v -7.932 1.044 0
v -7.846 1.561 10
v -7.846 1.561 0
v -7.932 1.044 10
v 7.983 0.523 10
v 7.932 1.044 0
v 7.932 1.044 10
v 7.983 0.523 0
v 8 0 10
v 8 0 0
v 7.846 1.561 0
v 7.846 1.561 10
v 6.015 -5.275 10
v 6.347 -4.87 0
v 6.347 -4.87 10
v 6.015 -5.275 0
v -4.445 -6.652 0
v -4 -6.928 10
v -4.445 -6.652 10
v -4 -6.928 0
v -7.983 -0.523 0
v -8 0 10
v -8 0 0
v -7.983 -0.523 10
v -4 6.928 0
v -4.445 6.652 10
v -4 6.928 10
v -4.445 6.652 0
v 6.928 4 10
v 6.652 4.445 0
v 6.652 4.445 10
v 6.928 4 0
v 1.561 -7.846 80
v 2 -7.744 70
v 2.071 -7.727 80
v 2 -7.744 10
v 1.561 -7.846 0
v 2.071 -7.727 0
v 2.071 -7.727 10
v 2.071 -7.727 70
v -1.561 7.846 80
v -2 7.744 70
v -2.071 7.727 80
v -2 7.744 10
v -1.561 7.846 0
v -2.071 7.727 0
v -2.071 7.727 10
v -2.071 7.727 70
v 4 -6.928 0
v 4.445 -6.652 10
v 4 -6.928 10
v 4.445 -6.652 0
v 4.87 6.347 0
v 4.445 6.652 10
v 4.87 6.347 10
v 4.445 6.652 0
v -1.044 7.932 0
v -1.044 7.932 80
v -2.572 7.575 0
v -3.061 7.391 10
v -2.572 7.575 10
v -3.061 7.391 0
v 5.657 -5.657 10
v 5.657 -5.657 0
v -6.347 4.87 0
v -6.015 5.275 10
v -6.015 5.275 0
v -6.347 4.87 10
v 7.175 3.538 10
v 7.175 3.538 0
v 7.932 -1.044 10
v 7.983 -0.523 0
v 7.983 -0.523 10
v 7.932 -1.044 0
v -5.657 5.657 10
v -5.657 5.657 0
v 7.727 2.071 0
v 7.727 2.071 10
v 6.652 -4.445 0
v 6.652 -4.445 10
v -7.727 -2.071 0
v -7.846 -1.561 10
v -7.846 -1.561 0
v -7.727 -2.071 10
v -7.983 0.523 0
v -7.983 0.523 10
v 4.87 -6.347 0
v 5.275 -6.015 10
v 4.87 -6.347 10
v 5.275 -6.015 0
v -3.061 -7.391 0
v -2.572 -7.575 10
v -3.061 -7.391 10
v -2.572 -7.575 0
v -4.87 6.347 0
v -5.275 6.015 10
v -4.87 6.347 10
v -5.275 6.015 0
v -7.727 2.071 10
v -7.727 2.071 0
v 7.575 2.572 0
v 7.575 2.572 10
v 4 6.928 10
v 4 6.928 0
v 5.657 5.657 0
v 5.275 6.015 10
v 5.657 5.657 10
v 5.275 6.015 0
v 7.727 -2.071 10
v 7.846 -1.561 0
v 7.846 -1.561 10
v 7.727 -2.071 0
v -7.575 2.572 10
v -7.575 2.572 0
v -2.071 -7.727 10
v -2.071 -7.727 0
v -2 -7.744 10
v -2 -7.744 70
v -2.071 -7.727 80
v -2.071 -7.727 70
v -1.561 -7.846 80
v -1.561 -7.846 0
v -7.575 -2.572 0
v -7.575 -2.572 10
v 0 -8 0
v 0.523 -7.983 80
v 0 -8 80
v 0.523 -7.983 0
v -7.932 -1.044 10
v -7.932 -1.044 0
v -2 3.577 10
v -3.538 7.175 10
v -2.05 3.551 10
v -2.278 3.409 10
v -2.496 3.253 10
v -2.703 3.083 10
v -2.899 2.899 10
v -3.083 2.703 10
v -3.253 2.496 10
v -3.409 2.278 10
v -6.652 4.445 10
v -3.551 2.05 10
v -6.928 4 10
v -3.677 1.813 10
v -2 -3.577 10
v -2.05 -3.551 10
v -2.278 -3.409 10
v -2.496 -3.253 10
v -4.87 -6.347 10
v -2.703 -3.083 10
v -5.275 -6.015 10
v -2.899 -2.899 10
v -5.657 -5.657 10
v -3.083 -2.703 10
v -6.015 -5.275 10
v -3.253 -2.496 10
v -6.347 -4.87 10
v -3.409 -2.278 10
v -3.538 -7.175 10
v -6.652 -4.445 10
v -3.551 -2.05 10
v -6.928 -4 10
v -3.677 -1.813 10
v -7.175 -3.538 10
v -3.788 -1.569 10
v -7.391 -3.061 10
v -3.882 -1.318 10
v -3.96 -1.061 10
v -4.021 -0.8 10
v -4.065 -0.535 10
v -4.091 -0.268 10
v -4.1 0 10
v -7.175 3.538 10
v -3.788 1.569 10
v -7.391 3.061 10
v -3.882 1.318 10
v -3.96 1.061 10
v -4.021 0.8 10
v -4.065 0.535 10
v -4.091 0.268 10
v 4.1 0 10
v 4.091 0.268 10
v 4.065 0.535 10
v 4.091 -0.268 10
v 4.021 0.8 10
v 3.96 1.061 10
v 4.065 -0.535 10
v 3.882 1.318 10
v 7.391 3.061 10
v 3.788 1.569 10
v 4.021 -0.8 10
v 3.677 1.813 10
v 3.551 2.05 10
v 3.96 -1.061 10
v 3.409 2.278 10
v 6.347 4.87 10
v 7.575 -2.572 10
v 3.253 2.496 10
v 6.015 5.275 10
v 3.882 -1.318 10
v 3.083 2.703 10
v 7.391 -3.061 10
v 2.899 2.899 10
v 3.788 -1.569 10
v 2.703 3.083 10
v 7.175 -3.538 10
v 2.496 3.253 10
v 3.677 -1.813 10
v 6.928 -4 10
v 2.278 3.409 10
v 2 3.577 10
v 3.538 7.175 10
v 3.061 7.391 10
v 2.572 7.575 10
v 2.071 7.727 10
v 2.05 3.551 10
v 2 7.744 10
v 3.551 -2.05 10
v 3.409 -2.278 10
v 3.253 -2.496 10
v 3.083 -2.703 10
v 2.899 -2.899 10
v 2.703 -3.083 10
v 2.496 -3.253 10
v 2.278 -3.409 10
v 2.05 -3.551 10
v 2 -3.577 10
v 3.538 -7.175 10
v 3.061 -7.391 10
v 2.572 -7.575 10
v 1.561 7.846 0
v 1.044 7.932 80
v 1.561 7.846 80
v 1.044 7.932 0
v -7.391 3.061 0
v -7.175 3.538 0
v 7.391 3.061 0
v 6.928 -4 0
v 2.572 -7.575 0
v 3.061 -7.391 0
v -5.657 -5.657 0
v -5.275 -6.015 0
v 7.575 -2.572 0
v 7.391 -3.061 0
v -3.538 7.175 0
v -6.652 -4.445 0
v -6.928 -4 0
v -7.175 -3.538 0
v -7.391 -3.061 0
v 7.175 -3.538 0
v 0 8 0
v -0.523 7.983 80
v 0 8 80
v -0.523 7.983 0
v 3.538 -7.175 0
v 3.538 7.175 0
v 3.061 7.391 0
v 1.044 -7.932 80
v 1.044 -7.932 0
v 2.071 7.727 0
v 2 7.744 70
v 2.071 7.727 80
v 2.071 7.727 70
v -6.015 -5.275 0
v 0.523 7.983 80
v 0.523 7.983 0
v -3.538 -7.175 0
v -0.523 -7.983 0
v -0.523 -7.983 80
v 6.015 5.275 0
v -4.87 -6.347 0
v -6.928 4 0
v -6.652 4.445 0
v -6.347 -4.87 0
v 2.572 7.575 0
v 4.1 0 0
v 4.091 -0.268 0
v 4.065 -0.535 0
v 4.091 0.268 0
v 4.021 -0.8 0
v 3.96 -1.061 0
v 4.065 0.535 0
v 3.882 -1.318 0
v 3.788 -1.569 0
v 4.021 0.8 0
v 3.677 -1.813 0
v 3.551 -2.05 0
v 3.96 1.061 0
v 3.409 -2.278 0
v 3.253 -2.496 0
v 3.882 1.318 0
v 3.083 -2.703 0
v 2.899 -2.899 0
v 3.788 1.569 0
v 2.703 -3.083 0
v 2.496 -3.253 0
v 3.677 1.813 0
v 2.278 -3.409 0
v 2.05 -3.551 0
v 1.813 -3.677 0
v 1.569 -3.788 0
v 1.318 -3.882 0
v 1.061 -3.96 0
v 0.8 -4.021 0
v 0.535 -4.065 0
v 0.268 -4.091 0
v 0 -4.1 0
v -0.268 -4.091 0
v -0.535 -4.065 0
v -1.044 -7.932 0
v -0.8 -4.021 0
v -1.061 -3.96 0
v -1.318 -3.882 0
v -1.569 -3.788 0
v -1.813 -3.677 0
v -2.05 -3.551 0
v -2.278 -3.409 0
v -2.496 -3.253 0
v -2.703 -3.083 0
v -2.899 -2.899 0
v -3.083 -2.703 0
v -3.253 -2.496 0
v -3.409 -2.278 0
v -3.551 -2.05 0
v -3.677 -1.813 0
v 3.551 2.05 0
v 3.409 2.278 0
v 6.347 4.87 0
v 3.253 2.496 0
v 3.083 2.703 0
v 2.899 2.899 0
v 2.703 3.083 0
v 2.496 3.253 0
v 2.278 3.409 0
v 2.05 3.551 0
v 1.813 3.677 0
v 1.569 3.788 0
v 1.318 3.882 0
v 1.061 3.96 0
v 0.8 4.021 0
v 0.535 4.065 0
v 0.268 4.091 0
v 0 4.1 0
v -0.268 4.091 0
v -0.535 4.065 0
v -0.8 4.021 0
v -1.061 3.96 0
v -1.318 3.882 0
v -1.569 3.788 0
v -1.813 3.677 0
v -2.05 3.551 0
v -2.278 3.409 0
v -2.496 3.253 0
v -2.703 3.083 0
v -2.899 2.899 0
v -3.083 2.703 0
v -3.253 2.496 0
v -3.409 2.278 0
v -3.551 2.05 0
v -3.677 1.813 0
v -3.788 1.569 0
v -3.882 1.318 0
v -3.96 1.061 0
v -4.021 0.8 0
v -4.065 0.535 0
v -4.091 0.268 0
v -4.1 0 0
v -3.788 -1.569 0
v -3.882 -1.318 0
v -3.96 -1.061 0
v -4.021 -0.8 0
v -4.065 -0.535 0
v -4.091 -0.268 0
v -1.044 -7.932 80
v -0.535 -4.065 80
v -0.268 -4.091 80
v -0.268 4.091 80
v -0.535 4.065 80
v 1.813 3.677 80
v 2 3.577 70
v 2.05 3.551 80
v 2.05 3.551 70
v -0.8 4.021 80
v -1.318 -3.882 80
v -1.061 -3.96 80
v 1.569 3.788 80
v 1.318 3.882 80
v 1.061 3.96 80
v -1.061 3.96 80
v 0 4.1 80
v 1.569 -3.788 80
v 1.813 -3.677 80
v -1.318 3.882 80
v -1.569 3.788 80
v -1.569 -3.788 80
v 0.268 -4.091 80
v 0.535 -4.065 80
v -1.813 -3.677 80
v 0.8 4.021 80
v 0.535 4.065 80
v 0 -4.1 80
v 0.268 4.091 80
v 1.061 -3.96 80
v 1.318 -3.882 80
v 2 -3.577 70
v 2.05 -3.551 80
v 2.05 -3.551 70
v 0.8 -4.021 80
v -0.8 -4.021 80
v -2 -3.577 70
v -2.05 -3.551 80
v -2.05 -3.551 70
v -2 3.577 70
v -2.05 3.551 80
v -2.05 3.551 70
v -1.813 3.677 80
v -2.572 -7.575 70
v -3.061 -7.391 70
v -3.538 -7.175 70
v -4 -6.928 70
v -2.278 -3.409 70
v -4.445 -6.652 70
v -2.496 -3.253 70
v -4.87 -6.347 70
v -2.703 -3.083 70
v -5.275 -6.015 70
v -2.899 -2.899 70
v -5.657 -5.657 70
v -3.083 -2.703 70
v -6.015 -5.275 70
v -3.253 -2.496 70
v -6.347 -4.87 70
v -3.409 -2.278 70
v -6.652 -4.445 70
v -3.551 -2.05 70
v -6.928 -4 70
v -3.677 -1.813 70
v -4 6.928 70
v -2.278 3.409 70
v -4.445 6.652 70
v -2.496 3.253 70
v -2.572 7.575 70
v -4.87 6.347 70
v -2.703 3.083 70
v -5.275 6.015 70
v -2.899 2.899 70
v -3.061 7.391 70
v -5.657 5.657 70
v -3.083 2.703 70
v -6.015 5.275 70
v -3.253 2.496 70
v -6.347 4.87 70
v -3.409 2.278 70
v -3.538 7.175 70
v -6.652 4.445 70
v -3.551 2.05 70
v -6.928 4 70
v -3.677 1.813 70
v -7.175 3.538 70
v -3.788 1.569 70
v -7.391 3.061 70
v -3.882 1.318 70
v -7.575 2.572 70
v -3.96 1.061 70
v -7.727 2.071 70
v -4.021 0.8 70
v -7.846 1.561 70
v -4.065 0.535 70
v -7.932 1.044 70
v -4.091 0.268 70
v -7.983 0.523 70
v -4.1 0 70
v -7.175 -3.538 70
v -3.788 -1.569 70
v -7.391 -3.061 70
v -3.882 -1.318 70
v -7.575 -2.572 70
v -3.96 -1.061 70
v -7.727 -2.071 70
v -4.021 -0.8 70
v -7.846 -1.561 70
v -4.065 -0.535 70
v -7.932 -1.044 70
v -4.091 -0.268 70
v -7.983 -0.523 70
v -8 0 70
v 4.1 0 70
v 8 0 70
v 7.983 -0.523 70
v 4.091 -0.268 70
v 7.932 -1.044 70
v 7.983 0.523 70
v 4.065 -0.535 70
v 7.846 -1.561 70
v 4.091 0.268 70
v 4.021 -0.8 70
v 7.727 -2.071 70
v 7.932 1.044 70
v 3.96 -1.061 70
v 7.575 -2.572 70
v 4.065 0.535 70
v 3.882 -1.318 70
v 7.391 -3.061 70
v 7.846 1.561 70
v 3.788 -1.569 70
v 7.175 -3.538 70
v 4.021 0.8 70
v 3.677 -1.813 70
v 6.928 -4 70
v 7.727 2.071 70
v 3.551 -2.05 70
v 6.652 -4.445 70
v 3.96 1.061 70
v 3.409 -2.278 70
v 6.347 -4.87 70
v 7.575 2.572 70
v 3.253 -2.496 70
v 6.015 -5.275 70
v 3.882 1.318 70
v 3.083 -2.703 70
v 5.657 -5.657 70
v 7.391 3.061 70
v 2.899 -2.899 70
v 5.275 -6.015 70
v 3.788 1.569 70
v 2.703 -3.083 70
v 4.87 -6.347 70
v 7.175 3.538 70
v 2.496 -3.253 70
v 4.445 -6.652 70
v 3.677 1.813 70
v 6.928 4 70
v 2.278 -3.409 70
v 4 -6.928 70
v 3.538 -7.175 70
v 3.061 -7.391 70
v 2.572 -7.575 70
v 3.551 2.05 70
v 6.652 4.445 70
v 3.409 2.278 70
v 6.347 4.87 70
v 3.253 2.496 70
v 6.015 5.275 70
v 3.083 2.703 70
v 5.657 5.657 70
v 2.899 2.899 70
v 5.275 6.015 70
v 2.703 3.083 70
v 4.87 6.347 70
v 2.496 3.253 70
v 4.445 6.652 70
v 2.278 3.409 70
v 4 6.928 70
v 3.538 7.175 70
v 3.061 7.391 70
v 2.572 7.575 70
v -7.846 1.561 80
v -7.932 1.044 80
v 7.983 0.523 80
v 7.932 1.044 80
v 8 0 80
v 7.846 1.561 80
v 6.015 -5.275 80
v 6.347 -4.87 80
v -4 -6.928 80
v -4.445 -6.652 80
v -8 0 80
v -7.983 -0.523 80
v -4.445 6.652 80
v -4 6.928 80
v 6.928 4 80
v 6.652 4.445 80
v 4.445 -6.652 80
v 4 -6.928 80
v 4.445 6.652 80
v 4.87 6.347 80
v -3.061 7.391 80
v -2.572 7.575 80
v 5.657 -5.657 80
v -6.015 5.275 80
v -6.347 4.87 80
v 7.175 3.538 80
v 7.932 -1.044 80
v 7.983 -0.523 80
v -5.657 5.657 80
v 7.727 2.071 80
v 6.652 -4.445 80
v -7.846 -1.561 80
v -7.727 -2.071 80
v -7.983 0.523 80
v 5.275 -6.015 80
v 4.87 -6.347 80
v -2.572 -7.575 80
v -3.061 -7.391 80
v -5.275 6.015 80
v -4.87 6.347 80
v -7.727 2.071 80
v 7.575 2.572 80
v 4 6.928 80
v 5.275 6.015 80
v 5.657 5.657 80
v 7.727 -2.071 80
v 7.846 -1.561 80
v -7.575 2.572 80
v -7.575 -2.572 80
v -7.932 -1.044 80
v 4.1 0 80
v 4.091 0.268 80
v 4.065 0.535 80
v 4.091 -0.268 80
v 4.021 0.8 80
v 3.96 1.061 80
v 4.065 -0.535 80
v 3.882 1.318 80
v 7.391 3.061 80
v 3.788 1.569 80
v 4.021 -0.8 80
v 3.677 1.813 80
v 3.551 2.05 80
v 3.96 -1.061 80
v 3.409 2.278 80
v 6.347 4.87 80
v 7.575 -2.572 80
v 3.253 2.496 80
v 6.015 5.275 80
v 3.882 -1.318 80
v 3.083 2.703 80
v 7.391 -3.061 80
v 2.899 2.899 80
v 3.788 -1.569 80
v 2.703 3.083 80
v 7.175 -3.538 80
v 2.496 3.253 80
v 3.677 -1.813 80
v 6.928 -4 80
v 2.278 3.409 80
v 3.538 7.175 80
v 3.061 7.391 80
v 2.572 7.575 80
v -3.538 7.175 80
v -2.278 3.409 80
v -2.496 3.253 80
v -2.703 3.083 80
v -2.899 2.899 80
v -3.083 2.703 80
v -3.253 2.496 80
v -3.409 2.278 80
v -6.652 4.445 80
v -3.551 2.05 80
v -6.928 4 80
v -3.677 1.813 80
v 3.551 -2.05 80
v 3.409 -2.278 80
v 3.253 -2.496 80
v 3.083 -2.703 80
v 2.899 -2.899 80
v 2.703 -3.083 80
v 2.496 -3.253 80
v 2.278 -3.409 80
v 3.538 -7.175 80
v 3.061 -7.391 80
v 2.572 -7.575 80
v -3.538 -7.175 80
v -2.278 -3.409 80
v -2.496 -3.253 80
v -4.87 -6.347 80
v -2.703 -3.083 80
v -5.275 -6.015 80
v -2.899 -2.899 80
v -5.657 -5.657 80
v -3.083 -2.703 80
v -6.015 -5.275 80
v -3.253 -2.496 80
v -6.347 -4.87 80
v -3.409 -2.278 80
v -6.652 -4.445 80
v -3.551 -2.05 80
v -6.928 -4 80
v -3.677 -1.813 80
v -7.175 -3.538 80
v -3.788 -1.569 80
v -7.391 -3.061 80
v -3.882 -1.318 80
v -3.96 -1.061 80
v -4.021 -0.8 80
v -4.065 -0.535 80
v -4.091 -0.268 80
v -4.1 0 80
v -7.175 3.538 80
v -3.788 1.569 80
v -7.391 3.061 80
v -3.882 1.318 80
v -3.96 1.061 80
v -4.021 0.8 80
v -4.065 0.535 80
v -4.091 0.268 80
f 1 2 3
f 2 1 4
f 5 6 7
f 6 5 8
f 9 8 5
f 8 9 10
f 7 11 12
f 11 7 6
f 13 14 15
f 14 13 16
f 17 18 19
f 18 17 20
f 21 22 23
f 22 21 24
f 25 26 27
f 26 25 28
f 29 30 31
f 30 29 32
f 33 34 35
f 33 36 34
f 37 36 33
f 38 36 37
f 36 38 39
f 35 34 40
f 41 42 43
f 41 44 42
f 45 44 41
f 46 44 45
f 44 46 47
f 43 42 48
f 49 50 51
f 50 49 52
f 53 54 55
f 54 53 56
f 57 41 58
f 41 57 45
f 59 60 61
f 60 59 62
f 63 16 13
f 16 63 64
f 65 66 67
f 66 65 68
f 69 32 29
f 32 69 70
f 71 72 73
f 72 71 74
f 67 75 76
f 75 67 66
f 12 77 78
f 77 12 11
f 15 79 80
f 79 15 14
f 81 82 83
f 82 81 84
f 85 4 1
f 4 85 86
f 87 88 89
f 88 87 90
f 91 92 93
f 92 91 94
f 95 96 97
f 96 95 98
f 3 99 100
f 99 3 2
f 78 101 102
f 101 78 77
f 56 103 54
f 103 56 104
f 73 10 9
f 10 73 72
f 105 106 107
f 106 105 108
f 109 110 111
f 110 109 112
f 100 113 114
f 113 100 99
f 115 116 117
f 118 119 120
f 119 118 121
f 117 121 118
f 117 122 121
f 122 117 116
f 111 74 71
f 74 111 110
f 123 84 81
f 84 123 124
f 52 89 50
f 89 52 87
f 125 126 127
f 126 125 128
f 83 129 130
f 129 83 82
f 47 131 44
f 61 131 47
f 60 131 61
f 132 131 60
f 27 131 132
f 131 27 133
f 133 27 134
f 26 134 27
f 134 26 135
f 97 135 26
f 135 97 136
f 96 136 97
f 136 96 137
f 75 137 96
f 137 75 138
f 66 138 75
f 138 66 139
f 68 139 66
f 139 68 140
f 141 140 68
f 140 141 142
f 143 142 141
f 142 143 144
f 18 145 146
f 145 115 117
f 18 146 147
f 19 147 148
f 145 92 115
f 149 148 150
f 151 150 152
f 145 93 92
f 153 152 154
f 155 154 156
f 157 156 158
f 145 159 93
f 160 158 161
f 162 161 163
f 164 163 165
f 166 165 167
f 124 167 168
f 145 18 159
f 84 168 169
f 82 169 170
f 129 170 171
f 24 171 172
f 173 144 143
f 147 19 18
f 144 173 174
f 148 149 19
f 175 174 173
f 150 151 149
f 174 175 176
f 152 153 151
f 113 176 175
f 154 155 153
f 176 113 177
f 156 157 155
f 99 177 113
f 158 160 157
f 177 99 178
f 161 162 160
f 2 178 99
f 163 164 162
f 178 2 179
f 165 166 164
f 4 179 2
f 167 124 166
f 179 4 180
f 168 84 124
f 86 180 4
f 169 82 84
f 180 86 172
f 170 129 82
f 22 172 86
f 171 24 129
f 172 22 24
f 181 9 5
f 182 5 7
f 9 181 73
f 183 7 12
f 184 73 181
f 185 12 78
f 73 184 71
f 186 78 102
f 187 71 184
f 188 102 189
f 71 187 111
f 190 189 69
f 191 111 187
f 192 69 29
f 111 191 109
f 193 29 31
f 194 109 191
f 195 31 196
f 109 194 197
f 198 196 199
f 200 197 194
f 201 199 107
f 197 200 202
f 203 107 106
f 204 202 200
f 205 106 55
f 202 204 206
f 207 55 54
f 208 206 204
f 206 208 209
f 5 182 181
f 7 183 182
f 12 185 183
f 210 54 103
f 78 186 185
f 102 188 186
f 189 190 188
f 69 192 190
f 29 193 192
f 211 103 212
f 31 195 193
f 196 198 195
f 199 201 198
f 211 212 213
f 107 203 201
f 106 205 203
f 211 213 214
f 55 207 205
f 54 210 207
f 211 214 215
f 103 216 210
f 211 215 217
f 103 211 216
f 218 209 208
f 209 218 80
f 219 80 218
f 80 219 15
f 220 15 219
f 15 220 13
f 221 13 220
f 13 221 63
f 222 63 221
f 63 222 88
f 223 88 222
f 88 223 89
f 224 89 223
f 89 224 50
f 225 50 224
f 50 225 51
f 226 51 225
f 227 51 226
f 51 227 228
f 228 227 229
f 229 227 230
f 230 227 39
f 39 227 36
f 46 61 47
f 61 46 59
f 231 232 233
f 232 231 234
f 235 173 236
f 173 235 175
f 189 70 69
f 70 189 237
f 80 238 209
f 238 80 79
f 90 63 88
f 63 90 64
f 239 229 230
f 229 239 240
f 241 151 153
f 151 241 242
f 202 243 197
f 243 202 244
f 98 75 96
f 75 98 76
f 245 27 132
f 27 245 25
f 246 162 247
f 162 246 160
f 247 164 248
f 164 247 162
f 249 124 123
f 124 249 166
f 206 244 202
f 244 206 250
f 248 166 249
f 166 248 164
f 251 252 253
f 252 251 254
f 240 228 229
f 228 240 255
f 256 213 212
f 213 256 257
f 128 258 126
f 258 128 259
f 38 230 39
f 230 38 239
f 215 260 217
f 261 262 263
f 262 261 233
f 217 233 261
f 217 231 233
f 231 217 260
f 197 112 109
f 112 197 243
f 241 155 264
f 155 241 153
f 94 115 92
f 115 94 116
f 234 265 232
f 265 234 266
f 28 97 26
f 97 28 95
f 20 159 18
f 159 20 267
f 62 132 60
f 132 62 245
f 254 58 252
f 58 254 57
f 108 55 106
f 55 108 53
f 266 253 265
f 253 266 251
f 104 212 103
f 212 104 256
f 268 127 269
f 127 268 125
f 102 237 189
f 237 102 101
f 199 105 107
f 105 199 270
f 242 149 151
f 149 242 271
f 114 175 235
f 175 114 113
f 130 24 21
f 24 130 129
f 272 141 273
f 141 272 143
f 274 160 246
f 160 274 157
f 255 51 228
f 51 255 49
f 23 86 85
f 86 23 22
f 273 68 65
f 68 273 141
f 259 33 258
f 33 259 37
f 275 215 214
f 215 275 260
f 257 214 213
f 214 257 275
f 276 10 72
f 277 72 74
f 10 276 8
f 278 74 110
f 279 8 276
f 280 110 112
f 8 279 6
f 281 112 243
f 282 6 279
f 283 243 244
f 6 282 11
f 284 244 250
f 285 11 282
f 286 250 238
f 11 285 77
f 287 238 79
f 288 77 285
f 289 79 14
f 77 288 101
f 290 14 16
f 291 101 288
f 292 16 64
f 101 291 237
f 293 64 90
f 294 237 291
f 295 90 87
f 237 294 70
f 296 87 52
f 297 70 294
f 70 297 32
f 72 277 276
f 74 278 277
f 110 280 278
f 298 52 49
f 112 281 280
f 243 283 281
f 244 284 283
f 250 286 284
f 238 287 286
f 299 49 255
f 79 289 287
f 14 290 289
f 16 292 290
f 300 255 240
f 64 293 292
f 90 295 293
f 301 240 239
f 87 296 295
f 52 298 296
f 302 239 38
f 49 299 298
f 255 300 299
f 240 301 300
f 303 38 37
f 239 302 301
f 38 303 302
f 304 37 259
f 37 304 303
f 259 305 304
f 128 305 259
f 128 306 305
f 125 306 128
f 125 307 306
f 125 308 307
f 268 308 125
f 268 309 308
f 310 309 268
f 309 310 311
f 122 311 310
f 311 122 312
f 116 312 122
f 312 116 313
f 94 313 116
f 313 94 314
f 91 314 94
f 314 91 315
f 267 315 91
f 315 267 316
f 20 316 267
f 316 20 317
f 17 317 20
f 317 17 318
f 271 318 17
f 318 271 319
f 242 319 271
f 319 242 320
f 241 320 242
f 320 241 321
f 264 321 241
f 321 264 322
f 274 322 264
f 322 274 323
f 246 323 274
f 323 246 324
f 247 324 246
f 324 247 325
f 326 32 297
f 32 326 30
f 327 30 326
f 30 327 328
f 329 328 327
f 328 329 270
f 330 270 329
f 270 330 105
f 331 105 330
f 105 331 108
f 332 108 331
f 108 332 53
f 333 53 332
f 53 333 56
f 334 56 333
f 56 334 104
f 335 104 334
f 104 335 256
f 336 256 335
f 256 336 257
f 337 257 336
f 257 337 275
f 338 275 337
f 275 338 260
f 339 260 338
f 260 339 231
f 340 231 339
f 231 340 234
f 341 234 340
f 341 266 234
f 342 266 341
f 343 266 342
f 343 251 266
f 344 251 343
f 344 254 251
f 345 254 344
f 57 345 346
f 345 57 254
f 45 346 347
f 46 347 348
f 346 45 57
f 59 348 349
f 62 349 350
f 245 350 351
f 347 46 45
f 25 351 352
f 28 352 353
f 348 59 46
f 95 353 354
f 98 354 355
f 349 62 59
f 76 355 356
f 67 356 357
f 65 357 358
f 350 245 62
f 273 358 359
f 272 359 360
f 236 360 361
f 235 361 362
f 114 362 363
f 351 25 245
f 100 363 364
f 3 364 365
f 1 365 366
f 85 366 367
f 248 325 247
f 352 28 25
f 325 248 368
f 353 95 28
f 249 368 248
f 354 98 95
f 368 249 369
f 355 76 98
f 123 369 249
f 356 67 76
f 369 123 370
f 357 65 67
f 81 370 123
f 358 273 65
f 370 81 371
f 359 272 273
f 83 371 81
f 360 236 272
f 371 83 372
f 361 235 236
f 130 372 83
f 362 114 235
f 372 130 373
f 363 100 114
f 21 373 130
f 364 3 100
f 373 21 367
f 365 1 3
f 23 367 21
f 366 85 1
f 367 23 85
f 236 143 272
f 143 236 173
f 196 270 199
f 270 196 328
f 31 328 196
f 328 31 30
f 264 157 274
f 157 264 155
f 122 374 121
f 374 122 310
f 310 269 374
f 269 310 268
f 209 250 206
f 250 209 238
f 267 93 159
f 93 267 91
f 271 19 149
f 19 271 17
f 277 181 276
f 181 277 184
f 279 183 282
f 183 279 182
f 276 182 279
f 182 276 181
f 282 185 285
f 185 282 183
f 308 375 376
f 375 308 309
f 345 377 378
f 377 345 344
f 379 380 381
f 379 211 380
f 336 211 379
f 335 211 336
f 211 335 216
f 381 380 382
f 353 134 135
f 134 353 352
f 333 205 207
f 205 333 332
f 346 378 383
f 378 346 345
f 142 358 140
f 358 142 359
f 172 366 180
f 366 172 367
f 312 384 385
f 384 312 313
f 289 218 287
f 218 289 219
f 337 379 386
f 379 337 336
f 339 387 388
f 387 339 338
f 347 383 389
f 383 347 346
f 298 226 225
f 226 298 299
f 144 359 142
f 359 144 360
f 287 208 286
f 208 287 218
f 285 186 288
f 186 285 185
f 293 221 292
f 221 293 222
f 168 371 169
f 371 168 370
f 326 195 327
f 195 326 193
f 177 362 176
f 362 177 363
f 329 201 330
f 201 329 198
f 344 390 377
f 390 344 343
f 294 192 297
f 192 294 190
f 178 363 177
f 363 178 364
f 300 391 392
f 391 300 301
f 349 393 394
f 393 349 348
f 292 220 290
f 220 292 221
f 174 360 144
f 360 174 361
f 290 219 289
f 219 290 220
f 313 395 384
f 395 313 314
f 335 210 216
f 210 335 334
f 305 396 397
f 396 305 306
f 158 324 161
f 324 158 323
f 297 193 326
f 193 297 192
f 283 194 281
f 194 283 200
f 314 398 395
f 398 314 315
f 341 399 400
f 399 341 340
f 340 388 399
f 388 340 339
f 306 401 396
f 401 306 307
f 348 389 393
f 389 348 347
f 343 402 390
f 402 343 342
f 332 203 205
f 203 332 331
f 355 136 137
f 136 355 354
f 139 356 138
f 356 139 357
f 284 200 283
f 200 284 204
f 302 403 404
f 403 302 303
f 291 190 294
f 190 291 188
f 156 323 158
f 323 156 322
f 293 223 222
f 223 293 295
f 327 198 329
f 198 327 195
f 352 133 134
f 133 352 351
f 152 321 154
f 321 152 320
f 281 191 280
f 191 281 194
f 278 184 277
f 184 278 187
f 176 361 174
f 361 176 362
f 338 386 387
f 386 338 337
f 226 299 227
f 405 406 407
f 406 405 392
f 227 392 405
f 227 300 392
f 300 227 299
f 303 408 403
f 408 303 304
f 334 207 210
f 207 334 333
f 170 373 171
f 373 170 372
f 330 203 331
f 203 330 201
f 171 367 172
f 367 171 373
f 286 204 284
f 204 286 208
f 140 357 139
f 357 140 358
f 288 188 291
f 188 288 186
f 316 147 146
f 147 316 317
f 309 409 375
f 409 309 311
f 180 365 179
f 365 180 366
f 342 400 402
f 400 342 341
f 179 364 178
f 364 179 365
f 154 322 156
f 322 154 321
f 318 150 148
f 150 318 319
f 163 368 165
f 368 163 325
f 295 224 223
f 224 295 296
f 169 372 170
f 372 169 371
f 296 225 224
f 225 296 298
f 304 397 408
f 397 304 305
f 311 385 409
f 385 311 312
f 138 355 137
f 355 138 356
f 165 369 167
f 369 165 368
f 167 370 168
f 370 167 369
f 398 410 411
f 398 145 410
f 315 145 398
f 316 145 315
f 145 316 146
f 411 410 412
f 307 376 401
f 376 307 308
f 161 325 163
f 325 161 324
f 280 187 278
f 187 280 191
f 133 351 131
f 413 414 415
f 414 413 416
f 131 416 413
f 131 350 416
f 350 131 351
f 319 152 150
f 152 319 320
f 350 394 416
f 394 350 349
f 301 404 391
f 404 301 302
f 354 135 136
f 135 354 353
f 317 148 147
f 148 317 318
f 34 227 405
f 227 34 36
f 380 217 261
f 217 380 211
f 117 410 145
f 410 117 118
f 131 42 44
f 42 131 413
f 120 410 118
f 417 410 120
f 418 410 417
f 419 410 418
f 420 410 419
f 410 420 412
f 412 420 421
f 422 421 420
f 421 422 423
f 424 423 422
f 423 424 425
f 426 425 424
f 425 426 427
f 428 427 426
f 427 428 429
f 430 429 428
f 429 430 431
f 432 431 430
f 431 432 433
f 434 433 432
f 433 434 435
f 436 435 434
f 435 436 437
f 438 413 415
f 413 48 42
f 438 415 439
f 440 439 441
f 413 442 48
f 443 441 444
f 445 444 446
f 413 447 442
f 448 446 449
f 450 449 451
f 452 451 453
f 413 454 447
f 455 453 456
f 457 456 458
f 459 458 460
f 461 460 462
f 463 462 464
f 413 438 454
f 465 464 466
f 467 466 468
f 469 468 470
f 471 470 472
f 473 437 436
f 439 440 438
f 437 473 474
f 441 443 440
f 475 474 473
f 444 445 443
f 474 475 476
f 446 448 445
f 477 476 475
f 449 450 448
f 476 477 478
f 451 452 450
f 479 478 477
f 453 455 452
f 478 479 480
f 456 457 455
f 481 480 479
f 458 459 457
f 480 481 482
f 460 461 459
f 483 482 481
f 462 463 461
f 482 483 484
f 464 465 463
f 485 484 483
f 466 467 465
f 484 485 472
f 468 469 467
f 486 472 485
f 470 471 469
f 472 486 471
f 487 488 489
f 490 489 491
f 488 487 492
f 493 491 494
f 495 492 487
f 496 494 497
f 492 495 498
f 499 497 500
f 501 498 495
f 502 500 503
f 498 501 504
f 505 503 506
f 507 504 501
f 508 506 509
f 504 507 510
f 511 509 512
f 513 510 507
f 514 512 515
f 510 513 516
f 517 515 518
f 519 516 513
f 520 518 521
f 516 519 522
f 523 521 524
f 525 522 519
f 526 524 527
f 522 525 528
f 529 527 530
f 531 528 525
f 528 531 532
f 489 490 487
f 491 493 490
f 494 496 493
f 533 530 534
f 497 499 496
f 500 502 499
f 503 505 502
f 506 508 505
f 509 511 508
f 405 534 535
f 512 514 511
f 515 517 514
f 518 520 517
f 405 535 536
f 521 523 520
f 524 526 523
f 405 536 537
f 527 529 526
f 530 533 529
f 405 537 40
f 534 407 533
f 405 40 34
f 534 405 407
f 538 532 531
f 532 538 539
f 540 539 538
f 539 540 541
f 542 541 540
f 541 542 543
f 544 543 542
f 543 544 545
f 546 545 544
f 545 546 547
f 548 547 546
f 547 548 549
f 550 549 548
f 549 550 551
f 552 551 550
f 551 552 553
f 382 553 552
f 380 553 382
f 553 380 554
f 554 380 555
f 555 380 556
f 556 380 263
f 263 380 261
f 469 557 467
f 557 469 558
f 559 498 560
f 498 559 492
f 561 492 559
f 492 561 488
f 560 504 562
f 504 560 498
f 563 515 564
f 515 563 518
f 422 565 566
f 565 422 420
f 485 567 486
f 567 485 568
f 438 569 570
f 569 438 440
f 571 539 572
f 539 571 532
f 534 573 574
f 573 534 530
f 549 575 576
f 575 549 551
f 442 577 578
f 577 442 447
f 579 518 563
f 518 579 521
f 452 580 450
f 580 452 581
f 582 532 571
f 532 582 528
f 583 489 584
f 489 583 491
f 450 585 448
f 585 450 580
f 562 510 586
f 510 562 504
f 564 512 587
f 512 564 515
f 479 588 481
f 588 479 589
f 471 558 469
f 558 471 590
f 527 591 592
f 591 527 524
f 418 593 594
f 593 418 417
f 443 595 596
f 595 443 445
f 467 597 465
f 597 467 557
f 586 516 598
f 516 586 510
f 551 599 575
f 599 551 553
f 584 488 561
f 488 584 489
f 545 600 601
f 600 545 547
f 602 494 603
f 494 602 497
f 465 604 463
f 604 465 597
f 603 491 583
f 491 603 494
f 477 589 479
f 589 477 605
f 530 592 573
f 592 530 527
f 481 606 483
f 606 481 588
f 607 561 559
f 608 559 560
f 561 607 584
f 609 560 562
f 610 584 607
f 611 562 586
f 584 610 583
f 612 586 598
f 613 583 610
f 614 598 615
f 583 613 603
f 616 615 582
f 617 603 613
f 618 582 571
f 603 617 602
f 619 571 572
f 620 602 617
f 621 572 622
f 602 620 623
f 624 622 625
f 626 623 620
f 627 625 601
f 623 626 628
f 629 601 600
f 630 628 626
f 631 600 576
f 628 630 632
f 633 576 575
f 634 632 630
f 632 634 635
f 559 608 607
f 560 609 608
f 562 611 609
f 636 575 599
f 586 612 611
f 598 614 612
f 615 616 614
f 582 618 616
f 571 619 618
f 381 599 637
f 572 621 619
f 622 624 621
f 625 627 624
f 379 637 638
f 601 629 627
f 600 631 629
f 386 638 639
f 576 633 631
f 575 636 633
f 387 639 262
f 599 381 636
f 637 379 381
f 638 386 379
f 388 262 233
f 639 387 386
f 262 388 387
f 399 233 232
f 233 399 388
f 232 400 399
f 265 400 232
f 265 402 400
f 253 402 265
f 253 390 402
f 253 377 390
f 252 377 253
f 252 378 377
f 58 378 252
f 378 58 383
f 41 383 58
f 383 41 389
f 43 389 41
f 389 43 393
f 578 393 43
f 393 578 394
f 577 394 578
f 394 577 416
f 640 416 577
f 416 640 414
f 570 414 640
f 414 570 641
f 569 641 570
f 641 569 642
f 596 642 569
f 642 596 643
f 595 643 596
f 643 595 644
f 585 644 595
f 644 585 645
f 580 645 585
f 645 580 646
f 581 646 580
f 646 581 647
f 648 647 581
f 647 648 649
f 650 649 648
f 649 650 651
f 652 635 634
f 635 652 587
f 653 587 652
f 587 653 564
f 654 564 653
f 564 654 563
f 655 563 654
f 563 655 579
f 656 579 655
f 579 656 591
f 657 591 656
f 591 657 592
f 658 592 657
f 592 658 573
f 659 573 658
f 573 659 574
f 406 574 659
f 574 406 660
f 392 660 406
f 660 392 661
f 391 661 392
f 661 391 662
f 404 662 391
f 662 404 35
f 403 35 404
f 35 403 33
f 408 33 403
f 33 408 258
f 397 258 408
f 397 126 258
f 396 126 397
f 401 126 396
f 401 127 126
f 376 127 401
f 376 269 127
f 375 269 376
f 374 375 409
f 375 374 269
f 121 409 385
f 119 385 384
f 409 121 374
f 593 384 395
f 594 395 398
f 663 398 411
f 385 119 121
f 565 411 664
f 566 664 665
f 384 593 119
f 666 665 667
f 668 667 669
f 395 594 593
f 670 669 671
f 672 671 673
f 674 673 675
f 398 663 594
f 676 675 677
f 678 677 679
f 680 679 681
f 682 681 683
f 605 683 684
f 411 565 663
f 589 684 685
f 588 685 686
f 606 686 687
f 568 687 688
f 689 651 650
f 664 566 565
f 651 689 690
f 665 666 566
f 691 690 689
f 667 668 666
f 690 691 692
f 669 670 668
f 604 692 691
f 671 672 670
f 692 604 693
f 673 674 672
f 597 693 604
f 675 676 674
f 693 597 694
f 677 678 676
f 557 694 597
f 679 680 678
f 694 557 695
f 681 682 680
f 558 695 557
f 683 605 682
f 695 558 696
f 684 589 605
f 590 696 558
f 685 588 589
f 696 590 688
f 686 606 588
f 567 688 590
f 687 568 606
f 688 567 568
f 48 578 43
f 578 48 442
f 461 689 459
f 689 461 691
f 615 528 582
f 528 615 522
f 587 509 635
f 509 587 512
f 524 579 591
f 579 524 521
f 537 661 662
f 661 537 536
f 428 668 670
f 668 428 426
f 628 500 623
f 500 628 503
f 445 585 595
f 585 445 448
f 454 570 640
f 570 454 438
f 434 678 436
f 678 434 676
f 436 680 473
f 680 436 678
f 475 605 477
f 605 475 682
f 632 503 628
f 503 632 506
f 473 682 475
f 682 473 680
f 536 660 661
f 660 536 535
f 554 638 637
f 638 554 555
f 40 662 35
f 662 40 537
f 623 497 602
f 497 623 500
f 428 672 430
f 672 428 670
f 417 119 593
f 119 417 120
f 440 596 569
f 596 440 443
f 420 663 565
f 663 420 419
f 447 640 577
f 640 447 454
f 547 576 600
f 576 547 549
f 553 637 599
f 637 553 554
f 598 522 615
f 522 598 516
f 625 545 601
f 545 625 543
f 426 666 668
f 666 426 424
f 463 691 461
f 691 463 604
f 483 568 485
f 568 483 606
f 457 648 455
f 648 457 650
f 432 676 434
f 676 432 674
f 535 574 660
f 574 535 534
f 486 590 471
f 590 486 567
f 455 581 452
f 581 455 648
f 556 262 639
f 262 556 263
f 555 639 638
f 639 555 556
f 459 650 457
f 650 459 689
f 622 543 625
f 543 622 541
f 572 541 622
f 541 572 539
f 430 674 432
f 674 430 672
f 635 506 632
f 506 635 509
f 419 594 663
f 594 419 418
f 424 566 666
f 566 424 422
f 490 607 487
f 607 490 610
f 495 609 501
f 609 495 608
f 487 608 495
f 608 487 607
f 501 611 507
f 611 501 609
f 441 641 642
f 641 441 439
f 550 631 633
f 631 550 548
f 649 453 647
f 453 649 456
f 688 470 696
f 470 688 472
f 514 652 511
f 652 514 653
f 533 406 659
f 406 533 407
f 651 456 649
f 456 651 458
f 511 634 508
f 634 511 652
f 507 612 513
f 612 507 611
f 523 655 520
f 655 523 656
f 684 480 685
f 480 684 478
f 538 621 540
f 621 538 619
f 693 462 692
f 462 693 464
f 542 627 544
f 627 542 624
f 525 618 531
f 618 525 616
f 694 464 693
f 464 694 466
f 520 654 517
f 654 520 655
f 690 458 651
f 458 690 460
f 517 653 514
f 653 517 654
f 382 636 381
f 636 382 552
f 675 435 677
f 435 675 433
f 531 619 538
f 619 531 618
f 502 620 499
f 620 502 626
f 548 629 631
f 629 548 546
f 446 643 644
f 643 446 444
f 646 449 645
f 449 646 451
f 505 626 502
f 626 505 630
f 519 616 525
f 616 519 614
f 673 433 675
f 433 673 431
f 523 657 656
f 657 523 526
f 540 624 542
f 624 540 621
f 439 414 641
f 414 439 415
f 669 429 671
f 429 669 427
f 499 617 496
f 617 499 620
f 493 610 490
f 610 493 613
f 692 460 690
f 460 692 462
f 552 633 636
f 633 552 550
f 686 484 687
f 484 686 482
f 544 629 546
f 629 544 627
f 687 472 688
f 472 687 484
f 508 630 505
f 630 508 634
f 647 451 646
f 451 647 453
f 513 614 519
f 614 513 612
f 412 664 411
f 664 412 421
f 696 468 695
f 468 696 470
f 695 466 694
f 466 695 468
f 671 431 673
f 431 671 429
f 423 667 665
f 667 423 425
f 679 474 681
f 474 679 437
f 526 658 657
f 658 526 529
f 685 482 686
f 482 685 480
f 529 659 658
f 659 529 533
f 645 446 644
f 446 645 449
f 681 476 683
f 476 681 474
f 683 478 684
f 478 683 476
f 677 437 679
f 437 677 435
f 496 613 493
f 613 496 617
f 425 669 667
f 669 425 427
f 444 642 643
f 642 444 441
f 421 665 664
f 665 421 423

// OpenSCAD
// file: defs.scad
RealityScale = [1.27, 1.27, 1.27];
ViewScale = [0.0254, 0.0254, 0.0254];
JointVertSpace=30;
LayerUnit=100;
SpacedLayer=LayerUnit+JointVertSpace;
JointR = 400;
ShaftR = 200;
ShaftHole=230;
ShaftTight=205;
HexTight=210;
MagicMult = 50;

// Spine Horizontal
MagicA = MagicMult * 38;
// Spine Verticial
MagicL = MagicMult * 7.8;

// Leg Triangle
MagicG = MagicMult * 36.7; // a
MagicH = MagicMult * 65.7; // c
MagicI = MagicMult * 49;   // b

// Driver Triangle
MagicB = MagicMult * 41.5;
MagicD = MagicMult * 40.1;
MagicE = MagicMult * 55.8;

// Front Strut
MagicC = MagicMult * 39.3;
FsLen = MagicC;

// Back Strut
MagicF = MagicMult * 39.4;
BsLen = MagicF;

// Lower Driver Strut
MagicK = MagicMult * 61.9;

// Upper Driver Strut
MagicJ = MagicMult * 50;

// Cam radius
MagicM = MagicMult * 15;

spineLength = sqrt(pow(MagicA, 2) + pow(MagicL,2));
// main file
include <defs.scad>
use <MCAD/involute_gears.scad>
RealityScale = 1.27;
RealityVec=[RealityScale, RealityScale, RealityScale]; 
ViewScale=[.02,.02,.02];

module spanSection(length, clip)
{
    difference() {
        cylinder(length, r=JointR,$fn=96); // base
        union() {
            translate([0, 0, -1]) cylinder(length + 2, r=ShaftTight, $fn=96); // base
            if (clip)
            {
                translate([100, -JointR*4/3, -1]) cube([JointR, 1000, length+2]);
                translate([-(JointR+100), -JointR*4/3, -1]) cube([JointR, 1000, length+2]);
            }
        }
    }
}

scale(ViewScale)
{
    union() 
    {
        spanSection(500, 0);
        translate([0, 0, 500]) spanSection(3000, 1);
        translate([0, 0, 3500]) spanSection(500, 0);
    }
}
